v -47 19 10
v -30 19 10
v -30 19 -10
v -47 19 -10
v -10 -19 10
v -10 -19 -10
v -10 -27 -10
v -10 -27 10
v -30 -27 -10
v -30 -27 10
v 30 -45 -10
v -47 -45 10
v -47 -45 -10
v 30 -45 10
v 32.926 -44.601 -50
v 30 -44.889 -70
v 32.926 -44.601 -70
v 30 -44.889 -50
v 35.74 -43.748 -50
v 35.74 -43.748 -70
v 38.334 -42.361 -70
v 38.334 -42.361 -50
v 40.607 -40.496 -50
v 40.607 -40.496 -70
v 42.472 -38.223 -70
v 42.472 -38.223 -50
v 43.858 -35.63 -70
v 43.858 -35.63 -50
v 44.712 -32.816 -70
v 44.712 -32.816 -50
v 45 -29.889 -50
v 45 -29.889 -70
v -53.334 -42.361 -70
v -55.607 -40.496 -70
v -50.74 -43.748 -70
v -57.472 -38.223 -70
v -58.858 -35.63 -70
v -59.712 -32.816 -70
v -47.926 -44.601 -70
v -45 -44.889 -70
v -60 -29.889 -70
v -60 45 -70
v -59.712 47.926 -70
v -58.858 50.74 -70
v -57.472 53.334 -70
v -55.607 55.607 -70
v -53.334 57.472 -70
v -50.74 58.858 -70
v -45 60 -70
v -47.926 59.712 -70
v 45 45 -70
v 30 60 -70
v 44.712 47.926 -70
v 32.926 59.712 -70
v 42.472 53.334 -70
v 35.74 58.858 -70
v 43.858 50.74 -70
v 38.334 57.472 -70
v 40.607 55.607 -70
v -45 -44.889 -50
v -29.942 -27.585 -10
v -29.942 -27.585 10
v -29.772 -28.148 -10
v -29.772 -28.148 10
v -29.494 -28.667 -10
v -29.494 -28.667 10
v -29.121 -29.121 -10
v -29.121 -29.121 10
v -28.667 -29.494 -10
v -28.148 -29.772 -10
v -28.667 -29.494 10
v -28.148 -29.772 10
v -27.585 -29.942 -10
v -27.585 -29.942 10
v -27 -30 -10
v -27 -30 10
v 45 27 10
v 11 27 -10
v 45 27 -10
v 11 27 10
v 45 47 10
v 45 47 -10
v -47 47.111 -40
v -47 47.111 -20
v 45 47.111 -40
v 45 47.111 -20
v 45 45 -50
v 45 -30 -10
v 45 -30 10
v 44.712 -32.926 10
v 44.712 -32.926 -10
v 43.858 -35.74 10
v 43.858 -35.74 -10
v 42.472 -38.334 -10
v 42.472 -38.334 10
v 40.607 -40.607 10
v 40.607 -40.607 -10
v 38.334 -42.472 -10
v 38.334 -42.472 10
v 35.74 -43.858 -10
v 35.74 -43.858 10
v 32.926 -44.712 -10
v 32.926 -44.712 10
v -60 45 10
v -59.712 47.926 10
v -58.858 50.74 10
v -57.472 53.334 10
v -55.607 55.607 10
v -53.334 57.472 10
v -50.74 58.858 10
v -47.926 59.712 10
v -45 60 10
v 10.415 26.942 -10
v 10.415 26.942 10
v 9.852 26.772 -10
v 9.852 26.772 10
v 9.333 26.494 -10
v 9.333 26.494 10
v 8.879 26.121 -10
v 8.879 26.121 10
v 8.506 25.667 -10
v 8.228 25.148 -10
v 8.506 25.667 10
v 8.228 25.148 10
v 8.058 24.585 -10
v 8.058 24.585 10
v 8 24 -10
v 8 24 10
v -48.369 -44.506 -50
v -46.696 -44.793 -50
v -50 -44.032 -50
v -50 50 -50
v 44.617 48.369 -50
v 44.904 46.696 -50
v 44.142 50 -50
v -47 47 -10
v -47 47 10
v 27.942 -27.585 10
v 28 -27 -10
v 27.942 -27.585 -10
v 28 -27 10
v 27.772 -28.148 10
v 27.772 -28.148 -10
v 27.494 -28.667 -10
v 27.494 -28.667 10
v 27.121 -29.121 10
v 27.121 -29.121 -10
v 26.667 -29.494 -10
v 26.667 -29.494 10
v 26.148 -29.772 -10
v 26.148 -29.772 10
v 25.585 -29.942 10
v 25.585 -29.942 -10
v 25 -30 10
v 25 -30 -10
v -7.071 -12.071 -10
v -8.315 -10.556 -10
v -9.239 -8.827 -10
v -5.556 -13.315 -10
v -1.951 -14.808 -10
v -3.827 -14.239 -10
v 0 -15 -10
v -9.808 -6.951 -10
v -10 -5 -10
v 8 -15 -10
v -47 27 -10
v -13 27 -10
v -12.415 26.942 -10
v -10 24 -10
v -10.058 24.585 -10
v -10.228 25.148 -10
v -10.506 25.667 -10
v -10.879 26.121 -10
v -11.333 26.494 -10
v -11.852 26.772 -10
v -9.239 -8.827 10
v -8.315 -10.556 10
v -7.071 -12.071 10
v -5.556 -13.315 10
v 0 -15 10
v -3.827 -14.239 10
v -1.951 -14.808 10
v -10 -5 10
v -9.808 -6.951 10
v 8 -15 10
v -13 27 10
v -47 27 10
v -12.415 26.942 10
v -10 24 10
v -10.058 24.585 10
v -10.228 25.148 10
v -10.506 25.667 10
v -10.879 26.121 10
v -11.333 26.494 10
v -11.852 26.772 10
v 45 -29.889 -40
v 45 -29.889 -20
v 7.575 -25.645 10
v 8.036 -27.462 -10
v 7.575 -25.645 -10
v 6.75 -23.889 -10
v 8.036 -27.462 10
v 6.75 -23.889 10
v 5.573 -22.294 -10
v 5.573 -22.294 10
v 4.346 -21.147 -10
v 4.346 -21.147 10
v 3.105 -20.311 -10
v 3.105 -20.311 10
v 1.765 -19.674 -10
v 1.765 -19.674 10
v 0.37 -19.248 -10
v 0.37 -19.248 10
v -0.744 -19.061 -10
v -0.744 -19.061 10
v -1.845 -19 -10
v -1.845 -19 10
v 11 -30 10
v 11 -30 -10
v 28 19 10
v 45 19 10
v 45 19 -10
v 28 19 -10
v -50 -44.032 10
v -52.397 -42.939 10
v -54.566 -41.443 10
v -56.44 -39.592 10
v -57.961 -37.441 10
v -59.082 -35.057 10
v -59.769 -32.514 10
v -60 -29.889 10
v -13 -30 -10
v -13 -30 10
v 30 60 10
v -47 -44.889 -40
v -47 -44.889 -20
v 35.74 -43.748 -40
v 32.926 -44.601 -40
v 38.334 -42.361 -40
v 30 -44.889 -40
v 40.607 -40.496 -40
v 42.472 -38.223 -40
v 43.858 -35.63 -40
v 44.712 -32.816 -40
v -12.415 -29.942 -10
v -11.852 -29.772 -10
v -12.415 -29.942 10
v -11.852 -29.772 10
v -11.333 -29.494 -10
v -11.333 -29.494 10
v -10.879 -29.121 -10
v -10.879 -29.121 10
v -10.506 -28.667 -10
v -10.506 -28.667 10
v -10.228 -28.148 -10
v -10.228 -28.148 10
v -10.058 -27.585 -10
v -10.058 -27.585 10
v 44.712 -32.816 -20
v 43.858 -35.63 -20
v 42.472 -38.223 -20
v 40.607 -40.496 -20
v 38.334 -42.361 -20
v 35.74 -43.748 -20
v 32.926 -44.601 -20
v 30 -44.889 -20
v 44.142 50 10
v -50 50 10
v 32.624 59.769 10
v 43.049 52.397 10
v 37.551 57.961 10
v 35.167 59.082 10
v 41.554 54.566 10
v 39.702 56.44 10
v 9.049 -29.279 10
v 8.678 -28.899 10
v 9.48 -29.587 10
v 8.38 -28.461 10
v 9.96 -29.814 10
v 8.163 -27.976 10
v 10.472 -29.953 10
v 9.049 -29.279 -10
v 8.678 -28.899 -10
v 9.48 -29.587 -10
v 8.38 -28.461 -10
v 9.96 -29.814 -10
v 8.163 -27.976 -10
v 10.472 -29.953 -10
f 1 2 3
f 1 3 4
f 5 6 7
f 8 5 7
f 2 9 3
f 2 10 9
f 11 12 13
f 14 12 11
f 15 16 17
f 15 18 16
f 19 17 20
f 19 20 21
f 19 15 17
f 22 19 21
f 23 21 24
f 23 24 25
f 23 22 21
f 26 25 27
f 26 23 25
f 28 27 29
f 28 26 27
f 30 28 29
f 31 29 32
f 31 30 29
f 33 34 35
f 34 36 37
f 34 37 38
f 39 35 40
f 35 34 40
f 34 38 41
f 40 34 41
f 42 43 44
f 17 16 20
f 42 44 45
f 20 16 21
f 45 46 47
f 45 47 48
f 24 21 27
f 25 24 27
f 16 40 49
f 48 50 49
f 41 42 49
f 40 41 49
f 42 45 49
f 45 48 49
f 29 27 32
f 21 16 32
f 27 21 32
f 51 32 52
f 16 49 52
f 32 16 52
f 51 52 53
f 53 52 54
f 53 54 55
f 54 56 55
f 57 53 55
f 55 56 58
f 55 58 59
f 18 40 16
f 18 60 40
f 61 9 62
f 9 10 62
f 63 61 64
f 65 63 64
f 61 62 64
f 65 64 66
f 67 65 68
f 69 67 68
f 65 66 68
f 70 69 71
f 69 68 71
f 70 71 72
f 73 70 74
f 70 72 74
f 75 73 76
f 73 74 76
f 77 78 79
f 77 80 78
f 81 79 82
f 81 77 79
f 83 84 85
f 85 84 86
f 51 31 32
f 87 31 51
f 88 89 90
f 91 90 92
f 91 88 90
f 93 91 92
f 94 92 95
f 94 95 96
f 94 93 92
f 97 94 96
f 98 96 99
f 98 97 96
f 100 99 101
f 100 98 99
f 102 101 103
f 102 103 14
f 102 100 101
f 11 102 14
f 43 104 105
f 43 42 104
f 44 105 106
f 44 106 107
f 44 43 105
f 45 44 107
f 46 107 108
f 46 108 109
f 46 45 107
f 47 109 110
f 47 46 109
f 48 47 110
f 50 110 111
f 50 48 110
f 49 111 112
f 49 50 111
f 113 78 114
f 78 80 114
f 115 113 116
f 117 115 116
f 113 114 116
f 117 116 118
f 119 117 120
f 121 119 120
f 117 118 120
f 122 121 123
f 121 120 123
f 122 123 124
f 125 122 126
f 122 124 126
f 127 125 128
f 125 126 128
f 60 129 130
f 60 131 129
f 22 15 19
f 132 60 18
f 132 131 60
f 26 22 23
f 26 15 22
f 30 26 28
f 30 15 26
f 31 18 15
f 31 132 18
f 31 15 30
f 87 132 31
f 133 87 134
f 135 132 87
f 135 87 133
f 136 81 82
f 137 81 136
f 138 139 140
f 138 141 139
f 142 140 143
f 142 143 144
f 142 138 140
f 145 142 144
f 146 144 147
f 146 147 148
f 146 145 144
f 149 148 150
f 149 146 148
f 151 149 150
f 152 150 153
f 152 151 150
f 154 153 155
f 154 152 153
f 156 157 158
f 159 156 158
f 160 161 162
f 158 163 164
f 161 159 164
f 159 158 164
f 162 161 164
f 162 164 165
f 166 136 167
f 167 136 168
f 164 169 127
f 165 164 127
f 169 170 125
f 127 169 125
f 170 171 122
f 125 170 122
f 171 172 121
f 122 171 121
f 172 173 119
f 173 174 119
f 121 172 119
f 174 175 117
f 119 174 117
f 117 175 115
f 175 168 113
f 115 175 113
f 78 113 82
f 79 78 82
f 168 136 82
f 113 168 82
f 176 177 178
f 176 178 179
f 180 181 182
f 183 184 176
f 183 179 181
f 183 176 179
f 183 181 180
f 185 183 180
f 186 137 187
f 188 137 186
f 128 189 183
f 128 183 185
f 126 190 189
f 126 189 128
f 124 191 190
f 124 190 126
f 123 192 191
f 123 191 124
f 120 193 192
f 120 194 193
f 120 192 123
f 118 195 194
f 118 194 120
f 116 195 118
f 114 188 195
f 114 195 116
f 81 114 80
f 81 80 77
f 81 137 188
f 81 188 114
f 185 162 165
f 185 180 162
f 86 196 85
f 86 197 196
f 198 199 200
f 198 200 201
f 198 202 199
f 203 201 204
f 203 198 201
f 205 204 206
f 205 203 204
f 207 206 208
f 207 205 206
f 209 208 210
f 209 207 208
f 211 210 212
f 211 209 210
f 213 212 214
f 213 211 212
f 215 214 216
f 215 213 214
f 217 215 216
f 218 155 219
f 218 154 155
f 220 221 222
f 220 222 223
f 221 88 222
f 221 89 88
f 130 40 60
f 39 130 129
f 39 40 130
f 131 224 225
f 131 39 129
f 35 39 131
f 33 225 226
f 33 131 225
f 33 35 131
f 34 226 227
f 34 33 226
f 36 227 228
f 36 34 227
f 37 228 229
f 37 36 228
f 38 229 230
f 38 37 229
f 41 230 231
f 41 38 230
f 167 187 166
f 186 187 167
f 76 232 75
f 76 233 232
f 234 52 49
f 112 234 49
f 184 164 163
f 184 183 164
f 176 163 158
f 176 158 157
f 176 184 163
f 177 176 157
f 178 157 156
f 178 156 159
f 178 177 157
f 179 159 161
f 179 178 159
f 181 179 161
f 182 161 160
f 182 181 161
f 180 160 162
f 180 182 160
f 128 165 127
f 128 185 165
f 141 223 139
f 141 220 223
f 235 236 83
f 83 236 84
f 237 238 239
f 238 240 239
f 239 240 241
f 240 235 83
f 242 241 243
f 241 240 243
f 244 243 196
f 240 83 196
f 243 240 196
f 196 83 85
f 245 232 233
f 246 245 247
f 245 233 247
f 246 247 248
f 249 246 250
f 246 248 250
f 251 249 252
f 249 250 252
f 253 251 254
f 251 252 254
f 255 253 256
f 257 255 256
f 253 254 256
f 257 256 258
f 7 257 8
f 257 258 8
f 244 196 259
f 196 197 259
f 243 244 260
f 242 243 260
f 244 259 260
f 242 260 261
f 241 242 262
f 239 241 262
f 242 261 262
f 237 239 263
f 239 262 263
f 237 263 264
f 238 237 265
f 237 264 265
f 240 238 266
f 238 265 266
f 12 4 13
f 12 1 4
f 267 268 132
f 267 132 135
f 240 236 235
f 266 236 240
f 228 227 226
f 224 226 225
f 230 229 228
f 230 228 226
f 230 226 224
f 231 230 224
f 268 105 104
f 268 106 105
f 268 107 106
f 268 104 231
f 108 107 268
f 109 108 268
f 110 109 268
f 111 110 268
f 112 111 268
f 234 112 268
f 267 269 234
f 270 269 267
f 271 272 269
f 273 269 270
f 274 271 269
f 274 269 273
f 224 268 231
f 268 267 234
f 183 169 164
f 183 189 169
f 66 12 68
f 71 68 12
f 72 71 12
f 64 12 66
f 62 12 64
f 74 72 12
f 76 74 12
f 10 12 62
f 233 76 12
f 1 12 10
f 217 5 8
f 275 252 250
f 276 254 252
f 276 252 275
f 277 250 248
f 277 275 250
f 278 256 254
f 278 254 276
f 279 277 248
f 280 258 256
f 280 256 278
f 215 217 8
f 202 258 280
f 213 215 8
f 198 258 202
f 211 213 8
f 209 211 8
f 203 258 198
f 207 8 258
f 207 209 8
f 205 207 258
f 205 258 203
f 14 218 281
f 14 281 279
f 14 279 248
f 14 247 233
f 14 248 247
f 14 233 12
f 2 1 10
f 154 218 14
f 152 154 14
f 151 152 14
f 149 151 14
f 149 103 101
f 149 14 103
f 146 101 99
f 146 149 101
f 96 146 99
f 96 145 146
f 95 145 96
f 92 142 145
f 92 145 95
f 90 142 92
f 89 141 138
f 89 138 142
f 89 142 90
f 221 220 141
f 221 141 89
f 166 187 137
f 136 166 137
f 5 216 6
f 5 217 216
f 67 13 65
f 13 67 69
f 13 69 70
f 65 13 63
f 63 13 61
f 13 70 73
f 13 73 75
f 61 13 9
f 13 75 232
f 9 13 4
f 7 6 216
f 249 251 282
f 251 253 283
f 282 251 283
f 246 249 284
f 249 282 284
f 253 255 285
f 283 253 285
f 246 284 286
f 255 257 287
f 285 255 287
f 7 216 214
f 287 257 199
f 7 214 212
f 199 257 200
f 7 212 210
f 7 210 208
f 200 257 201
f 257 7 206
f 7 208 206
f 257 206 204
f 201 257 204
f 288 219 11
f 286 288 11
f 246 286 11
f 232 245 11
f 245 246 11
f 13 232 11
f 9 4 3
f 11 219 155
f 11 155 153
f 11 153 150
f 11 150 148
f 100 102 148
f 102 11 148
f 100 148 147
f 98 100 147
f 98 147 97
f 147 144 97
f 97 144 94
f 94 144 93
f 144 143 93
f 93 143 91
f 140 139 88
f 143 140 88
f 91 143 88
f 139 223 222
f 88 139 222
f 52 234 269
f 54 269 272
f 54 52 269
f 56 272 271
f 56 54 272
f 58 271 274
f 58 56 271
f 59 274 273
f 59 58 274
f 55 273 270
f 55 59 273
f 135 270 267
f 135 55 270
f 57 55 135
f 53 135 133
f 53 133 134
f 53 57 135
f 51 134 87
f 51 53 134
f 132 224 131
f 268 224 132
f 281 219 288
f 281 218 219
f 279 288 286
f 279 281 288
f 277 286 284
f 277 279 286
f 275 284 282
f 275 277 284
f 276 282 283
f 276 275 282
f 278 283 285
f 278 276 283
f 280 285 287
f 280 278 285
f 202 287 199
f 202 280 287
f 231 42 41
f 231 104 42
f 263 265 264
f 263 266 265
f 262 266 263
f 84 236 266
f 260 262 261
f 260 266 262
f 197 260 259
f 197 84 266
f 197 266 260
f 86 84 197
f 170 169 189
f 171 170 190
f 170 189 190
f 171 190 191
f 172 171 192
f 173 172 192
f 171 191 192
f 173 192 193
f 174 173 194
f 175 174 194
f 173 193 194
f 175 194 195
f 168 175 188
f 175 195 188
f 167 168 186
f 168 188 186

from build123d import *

# Parameters (mm, degrees)
F0_W          = 17
F0_H          = 20
F1_DEPTH      = 10
F1_DEPTH_BACK = 10
F5_DEPTH      = 10
F5_DEPTH_BACK = 70
F6_W          = 105
F6_H          = 104.889372
F7_DEPTH      = 10
F8_W          = 92
F8_H          = 92
F9_DEPTH      = 10
F10_R         = 15
F10_2_R       = 15
F10_3_R       = 15
F11_R         = 3
F12_R         = 10


with BuildPart() as f1:
    # F0 (on Top) → F1 (new body, two sides)
    with BuildSketch(Plane.XY) as f1_sk:
        Polygon((45, -45), (45, 19), (28, 19), (28, -30), (8, -30), (8, -19), (-10, -19), (-10, -30), (-30, -30), (-30, 19), (-47, 19), (-47, -45), align=None)
        with Locations((-38.5, 37)):
            Rectangle(F0_W, F0_H)
        Polygon((-10, -15), (8, -15), (8, 27), (45, 27), (45, 47), (-30, 47), (-30, 27), (-10, 27), align=None)
    extrude(amount=F1_DEPTH)
    extrude(f1_sk.sketch, amount=-F1_DEPTH_BACK)

    # F10#2
    f10_2_edges = [f1.edges().sort_by_distance(p)[0] for p in [
        (45, -45, 0),
    ]]
    fillet(f10_2_edges, radius=F10_2_R)

    # F11
    f11_edges = [f1.edges().sort_by_distance(p)[0] for p in [
        (8, -30, 0),
        (-30, -30, 0),
        (-10, -30, 0),
        (28, -30, 0),
        (-10, 27, 0),
        (8, 27, 0),
    ]]
    fillet(f11_edges, radius=F11_R)

    # F12
    f12_edges = [f1.edges().sort_by_distance(p)[0] for p in [
        (-10, -15, 0),
        (8, -19, 0),
    ]]
    fillet(f12_edges, radius=F12_R)


with BuildPart() as f5:
    # F4 (on Top) → F5 (new body, two sides)
    with BuildSketch(Plane.XY) as f5_sk:
        Polygon((-60, -44.889372), (-50, -44.889372), (-50, 50), (45, 50), (45, 60), (-60, 60), align=None)
    extrude(amount=F5_DEPTH)
    extrude(f5_sk.sketch, amount=-F5_DEPTH_BACK)

    # F6 (on offset) → F7 (join, symmetric)
    with BuildSketch(Plane.XY.offset(-60)):
        with Locations((-7.5, 7.555314)):
            Rectangle(F6_W, F6_H)
    extrude(amount=F7_DEPTH, both=True)

    # F10
    f10_edges = [f5.edges().sort_by_distance(p)[0] for p in [
        (45, 60, -30),
        (-60, -44.889372, -30),
        (45, -44.889372, -60),
        (-60, 60, -30),
    ]]
    fillet(f10_edges, radius=F10_R)


with BuildPart() as f9:
    # F8 (on offset) → F9 (new body, symmetric)
    with BuildSketch(Plane.XY.offset(-30)):
        with Locations((-1, 1.110628)):
            Rectangle(F8_W, F8_H)
    extrude(amount=F9_DEPTH, both=True)

    # F10#3
    f10_3_edges = [f9.edges().sort_by_distance(p)[0] for p in [
        (45, -44.889372, -30),
    ]]
    fillet(f10_3_edges, radius=F10_3_R)


solid = Compound([f1.part, f5.part, f9.part])
